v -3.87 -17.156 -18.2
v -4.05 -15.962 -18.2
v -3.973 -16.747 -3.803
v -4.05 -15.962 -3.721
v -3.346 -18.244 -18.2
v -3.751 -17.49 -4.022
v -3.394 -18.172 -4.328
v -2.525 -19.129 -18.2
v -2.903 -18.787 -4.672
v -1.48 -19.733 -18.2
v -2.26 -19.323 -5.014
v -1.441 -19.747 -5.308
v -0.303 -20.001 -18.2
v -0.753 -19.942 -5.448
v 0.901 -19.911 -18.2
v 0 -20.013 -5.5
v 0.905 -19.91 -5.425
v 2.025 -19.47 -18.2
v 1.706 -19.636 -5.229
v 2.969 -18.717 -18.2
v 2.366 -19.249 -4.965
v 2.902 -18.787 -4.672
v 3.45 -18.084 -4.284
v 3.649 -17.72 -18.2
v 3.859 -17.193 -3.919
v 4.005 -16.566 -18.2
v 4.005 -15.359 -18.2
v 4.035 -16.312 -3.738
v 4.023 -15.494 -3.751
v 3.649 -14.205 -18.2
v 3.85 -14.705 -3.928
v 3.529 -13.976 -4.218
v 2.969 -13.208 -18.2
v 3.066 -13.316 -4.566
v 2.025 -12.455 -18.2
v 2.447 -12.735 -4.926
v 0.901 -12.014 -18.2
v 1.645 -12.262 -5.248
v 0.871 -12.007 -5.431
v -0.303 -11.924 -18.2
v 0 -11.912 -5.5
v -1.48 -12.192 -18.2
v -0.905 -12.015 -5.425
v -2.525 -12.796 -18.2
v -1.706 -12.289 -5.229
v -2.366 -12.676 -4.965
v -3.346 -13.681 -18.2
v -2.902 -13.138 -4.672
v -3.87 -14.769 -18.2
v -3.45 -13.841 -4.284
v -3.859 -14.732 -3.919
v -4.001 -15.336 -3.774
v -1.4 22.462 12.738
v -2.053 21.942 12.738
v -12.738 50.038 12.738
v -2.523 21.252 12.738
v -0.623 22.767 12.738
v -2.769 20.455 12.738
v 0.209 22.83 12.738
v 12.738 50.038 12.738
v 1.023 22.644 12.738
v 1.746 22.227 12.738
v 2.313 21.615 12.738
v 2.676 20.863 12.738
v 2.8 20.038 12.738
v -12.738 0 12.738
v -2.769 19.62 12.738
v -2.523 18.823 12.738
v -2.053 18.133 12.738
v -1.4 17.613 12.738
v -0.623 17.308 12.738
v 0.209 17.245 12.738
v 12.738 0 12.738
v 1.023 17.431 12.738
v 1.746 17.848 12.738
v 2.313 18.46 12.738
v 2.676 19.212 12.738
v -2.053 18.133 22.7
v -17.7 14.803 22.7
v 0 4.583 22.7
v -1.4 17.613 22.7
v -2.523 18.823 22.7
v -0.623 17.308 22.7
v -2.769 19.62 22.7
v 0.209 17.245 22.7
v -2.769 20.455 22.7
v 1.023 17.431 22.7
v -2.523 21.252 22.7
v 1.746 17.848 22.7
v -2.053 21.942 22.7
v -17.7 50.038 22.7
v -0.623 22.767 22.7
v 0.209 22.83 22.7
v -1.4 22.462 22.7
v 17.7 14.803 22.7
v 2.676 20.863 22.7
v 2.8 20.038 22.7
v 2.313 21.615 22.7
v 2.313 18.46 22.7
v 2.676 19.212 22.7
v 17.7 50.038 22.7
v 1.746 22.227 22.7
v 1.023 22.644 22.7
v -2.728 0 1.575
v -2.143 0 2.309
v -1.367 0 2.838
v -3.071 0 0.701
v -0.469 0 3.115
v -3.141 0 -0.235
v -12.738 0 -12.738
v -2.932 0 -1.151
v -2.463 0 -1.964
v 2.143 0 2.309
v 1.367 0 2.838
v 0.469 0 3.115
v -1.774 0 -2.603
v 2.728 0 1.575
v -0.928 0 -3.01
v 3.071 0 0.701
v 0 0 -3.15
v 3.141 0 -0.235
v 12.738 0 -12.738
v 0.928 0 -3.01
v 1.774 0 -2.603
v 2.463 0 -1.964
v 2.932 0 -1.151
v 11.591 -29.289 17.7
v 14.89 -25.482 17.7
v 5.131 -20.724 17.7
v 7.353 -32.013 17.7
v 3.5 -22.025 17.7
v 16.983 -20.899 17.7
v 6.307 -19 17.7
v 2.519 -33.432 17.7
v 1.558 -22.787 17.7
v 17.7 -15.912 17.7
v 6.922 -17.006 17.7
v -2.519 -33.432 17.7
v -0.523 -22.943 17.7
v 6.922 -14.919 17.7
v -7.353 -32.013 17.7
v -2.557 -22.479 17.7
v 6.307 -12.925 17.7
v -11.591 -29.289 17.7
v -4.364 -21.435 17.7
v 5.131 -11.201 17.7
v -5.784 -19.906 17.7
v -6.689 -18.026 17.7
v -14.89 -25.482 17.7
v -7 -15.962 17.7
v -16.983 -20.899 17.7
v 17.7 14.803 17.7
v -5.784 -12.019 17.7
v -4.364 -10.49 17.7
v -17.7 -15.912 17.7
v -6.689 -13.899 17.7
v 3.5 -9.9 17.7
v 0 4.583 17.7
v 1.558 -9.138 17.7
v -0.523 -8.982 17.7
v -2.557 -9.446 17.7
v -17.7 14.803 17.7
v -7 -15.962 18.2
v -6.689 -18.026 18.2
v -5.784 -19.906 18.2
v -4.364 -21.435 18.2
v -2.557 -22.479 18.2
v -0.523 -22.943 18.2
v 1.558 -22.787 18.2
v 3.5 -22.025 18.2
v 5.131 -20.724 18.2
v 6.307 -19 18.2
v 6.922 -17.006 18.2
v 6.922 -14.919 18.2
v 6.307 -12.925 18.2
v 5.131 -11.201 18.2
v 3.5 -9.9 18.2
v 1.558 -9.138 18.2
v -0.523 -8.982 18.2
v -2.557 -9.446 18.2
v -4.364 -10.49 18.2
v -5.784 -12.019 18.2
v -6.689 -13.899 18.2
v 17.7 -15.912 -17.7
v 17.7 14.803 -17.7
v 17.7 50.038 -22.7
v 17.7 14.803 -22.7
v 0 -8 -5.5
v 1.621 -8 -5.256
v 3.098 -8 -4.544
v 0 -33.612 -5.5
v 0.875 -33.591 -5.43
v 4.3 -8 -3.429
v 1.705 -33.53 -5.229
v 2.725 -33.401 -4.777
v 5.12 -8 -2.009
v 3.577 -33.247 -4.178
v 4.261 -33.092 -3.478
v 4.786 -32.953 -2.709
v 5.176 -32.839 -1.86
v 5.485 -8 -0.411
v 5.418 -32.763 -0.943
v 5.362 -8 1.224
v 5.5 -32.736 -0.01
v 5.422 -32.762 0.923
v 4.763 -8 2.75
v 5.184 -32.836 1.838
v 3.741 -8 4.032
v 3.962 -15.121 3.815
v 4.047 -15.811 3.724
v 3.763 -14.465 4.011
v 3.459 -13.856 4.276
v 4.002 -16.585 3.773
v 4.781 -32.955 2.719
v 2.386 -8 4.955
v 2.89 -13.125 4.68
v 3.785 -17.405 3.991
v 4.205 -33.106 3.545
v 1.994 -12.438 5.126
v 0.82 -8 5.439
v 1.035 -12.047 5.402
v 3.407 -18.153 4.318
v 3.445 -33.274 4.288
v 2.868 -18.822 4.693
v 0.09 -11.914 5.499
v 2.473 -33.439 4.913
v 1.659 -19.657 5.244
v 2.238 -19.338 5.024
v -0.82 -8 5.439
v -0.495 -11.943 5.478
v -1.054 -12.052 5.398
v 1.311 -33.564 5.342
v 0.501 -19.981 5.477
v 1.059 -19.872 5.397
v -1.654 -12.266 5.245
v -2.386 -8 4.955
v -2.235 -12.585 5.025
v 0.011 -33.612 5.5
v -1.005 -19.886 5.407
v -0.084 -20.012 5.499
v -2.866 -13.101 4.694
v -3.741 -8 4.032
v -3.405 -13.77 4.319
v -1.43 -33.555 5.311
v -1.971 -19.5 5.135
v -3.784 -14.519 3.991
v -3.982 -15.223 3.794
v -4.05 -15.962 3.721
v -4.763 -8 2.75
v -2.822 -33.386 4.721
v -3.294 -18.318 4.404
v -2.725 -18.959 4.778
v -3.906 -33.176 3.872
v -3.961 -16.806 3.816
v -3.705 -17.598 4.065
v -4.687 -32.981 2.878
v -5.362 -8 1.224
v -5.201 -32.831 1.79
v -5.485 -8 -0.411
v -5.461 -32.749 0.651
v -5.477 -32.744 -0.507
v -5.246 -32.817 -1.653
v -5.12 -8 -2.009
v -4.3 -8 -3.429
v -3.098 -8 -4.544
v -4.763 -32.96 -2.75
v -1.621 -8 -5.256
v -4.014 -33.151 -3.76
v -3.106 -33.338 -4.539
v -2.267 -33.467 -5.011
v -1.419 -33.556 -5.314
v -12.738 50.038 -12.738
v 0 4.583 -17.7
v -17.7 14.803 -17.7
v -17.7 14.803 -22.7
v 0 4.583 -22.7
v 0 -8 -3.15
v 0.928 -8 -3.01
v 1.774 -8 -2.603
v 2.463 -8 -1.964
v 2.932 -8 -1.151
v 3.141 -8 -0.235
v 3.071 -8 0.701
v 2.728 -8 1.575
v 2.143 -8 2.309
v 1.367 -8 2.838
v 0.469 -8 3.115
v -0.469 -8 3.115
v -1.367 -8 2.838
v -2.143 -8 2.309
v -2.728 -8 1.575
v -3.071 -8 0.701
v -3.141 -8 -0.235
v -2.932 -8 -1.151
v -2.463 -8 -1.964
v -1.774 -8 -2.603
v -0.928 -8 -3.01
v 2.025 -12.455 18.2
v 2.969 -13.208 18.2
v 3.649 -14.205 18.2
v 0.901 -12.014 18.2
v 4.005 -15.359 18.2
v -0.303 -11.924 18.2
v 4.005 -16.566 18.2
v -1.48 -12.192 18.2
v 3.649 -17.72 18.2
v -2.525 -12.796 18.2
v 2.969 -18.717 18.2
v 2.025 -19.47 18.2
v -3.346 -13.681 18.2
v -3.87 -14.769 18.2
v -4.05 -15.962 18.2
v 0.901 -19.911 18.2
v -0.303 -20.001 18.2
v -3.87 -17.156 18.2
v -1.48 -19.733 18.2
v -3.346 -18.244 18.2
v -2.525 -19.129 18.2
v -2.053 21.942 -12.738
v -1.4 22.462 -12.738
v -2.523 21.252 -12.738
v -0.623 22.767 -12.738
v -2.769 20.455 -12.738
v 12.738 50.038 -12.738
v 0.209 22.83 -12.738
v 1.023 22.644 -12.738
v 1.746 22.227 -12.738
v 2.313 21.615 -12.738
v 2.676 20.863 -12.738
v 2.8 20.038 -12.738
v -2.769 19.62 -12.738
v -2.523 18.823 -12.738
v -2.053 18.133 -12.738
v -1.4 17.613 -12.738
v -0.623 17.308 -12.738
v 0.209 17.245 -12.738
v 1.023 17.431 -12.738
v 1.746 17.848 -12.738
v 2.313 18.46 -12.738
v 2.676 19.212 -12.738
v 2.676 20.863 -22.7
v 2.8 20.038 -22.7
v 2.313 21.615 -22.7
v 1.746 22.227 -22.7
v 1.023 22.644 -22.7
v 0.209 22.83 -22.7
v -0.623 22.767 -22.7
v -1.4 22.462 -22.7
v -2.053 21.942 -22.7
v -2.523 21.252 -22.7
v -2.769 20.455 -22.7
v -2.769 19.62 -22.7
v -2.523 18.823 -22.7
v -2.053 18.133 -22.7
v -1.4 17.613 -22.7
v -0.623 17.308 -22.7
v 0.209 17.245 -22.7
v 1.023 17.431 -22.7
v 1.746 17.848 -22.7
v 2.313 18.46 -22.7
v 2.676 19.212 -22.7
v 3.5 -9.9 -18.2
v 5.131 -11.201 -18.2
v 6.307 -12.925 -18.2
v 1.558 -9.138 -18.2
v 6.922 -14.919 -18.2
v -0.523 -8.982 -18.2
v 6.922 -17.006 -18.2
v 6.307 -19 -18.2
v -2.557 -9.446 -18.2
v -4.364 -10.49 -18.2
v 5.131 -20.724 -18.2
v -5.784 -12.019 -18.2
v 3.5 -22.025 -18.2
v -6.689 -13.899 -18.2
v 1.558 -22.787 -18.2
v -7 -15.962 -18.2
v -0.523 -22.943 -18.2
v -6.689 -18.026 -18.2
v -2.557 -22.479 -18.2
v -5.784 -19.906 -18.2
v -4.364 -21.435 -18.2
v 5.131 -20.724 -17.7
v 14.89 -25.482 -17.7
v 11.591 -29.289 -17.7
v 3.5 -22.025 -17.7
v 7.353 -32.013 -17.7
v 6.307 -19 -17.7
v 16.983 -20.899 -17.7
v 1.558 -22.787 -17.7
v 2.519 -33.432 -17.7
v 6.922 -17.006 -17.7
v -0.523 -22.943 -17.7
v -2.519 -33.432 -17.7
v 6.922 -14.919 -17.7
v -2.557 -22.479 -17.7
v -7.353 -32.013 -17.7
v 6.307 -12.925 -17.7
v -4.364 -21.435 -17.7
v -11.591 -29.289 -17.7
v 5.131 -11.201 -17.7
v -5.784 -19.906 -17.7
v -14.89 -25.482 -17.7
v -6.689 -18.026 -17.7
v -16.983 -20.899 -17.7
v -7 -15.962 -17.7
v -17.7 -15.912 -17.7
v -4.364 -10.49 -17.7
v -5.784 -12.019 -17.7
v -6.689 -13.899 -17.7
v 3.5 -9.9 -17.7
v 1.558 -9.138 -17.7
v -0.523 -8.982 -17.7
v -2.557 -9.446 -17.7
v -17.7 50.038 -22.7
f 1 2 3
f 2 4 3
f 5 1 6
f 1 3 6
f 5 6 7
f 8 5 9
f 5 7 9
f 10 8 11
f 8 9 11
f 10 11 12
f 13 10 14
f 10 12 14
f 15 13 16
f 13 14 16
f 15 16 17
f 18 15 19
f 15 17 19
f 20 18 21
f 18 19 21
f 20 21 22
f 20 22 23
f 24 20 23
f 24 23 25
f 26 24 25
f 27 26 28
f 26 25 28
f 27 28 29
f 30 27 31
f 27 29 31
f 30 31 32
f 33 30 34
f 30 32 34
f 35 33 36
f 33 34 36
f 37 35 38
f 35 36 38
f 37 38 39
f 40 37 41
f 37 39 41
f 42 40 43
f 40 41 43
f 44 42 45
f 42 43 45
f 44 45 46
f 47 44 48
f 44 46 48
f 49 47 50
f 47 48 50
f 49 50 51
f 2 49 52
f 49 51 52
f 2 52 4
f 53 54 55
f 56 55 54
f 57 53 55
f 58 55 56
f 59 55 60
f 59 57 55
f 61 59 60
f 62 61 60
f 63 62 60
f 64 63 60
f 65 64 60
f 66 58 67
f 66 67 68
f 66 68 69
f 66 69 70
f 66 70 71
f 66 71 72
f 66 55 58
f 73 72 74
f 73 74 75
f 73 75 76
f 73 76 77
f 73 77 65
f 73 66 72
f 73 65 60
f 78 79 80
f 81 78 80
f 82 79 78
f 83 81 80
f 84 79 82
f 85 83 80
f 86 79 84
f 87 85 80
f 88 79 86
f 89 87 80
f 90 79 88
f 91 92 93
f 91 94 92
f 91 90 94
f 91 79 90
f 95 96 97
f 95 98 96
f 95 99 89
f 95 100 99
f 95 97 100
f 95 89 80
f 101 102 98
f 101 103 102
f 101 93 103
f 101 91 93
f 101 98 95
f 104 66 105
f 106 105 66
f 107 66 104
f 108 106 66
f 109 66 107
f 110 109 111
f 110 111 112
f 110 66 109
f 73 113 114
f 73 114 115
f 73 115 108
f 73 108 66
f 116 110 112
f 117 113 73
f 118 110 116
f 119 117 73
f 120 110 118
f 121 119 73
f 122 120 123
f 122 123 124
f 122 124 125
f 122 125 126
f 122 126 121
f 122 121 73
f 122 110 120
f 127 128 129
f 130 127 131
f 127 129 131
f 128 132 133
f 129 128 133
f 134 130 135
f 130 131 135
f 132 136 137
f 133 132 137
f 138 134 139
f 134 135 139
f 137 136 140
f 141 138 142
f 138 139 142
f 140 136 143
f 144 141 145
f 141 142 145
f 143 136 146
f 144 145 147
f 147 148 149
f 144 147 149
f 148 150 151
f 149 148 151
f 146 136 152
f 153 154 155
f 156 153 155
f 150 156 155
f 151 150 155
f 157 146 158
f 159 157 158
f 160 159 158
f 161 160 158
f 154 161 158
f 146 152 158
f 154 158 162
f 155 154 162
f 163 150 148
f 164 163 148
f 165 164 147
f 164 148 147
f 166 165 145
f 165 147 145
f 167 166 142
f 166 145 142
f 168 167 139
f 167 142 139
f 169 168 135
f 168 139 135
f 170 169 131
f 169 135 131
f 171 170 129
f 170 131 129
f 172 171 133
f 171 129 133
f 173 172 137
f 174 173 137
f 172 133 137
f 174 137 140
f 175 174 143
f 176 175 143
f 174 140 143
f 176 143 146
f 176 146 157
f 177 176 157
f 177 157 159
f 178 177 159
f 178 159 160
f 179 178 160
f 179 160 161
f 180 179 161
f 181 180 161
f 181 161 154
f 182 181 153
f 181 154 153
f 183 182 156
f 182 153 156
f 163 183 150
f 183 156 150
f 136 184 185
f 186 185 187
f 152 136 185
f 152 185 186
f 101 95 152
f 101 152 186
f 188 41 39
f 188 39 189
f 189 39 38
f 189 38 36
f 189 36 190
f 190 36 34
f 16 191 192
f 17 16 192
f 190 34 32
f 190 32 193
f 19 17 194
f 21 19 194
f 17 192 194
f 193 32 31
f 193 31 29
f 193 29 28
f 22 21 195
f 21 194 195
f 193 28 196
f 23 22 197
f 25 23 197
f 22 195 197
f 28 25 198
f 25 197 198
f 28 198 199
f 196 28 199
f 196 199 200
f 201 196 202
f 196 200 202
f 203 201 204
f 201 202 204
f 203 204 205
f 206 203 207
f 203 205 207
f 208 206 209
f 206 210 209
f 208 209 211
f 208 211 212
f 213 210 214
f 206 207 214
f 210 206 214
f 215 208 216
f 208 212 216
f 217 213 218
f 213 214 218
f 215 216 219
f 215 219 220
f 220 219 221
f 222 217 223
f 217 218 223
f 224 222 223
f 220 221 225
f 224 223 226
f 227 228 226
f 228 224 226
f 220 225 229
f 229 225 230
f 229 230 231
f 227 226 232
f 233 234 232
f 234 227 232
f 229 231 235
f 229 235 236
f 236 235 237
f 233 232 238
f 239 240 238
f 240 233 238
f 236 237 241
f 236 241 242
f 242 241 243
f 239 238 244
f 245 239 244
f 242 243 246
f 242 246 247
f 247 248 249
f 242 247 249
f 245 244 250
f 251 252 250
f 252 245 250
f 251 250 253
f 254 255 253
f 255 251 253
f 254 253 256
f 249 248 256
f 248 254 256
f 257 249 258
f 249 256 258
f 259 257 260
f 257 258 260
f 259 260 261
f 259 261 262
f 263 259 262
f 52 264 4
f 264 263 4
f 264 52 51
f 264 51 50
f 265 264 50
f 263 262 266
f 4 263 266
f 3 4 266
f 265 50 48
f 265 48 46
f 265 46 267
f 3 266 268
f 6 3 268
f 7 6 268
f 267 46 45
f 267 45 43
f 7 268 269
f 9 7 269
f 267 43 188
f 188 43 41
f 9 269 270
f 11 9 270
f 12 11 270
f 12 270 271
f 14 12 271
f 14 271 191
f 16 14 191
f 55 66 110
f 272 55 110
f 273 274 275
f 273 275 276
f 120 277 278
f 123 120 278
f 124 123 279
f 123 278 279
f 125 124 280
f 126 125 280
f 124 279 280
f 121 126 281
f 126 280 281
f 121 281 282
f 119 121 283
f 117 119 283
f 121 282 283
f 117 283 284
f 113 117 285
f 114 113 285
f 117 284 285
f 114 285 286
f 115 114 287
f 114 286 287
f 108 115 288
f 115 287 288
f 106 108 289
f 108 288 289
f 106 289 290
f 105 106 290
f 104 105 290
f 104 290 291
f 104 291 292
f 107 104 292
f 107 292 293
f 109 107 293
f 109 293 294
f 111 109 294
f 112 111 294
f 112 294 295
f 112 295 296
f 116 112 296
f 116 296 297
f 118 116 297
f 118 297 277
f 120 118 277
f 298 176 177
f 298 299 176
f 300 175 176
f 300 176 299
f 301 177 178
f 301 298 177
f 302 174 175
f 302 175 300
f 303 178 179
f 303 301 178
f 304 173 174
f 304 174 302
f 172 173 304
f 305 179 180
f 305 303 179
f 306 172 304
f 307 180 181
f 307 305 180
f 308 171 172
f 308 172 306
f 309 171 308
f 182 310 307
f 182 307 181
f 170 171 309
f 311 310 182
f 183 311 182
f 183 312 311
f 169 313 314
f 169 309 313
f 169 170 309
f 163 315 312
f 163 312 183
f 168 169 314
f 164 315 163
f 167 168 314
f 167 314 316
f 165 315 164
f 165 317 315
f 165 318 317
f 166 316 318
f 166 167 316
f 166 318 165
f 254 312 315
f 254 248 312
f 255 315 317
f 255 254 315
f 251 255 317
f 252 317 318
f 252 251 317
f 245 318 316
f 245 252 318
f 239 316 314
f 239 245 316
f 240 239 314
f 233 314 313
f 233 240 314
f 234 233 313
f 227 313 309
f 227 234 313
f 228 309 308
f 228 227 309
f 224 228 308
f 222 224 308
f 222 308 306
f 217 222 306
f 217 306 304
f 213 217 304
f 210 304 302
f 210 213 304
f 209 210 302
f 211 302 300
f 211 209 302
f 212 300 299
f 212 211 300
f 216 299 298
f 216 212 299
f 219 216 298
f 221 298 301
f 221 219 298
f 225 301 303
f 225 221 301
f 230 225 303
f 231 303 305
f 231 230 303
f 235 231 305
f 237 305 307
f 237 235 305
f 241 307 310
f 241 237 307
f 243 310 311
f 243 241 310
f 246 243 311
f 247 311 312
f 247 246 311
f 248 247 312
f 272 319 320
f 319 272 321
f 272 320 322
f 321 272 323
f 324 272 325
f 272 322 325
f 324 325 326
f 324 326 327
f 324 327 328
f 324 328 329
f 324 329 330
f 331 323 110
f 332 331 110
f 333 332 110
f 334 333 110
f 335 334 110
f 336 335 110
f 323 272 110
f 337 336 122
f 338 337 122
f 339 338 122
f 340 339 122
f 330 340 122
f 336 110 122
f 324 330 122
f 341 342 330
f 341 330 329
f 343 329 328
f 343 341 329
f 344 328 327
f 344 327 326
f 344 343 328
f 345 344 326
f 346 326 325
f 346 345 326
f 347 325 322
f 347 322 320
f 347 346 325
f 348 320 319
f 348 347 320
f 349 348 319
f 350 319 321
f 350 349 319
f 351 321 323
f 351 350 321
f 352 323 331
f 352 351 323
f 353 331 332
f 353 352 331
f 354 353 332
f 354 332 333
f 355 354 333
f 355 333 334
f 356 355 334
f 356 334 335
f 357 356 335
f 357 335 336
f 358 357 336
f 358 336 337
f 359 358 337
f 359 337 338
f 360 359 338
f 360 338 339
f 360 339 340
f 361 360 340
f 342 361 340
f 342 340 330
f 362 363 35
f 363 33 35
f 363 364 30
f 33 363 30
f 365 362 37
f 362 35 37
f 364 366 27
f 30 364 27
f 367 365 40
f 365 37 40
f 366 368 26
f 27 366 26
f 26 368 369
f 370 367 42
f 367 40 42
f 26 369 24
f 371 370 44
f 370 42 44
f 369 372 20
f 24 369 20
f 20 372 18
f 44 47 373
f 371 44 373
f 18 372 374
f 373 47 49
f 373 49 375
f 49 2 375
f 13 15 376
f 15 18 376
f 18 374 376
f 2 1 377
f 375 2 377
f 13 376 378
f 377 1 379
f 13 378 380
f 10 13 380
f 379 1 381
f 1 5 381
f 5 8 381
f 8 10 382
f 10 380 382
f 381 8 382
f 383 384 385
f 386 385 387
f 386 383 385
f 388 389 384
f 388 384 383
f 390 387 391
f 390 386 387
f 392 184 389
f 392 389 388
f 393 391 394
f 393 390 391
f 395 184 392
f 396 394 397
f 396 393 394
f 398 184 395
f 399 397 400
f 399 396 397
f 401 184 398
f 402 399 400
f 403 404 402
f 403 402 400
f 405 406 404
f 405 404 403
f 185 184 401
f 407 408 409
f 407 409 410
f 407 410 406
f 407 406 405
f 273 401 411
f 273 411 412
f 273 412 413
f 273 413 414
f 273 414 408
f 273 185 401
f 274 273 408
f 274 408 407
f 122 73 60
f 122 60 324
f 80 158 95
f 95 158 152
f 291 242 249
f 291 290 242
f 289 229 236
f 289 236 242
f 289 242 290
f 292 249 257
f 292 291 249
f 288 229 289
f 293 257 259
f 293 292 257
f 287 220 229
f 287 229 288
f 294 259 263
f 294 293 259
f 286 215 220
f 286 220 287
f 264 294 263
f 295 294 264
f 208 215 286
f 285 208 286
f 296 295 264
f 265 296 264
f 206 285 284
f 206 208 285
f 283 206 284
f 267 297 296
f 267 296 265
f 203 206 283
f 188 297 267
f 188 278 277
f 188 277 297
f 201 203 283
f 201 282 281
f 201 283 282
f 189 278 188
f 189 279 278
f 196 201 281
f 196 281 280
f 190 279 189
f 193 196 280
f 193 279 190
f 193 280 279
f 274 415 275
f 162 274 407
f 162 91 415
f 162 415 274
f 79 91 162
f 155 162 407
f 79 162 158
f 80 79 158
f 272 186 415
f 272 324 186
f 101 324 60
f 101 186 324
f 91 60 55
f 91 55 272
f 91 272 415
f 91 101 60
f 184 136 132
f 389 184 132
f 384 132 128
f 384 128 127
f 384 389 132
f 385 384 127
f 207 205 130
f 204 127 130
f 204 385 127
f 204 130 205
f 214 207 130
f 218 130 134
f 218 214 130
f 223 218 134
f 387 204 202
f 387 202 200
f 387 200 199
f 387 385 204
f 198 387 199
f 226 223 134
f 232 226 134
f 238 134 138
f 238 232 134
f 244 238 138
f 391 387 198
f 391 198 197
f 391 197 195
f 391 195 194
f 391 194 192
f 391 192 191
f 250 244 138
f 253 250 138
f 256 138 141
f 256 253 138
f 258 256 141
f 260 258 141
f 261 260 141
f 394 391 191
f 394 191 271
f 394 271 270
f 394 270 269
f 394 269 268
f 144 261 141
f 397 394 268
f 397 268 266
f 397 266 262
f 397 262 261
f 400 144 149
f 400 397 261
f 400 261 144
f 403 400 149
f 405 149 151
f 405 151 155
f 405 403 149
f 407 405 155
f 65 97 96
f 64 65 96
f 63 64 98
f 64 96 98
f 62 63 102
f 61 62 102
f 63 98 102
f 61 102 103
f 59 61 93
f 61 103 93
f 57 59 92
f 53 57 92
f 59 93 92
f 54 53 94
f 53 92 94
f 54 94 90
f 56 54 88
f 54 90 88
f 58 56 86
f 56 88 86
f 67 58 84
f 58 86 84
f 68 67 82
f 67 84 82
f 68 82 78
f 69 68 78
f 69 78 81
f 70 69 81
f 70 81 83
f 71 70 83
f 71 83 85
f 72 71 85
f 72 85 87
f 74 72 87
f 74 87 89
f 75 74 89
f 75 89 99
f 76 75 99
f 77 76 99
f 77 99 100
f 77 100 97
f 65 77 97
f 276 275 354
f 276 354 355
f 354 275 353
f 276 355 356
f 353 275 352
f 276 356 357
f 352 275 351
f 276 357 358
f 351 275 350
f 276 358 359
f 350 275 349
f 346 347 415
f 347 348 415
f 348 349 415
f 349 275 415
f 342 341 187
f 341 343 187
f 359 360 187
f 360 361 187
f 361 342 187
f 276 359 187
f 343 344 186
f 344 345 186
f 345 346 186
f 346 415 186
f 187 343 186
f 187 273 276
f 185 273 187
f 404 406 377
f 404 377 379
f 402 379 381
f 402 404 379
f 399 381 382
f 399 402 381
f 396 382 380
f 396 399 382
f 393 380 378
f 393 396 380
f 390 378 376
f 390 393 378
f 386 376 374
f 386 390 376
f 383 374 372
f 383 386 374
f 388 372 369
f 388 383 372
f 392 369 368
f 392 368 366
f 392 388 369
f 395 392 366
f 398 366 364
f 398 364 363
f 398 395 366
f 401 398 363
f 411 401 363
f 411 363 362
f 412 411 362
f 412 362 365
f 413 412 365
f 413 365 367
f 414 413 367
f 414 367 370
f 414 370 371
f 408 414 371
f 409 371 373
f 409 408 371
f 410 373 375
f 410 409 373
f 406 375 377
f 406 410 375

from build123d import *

# Parameters (mm, degrees)
SKETCH1_W           = 35.4
SKETCH1_H           = 35.4
SKETCH1_W_2         = 25.475
SKETCH1_H_2         = 25.475
BOSS_EXTRUDE1_DEPTH = 50.0375
SKETCH1_3_W         = 35.4
SKETCH1_3_H         = 35.4
SKETCH1_3_W_2       = 25.475
SKETCH1_3_H_2       = 25.475
BOSS_EXTRUDE2_DEPTH = 9.9625
SKETCH2_R           = 4.05
BOSS_EXTRUDE5_DEPTH = 35.4
SKETCH3_R           = 3.15
CUT_EXTRUDE1_DEPTH  = 88.31496149
SKETCH4_R           = 5.5
CUT_EXTRUDE2_DEPTH  = 25.6125
SKETCH5_R           = 7
SKETCH5_R_2         = 4.05
BOSS_EXTRUDE6_DEPTH = 0.5
BOSS_EXTRUDE7_DEPTH = 5
CUT_EXTRUDE3_REACH  = 69.006
SKETCH7_R           = 2.8


with BuildPart() as part:
    # Sketch1 → Boss-Extrude1 (new body)
    with BuildSketch(Plane(origin=(0, 0, 0), x_dir=(1, 0, 0), z_dir=(0, 1, 0))):
        Rectangle(SKETCH1_W, SKETCH1_H)
        Rectangle(SKETCH1_W_2, SKETCH1_H_2, mode=Mode.SUBTRACT)
    extrude(amount=BOSS_EXTRUDE1_DEPTH)

    # Sketch1<3> → Boss-Extrude2 (add)
    # profile 1 of 2: a face of its own
    with BuildSketch(Plane(origin=(0, 0, 0), x_dir=(1, 0, 0), z_dir=(0, 1, 0))):
        Rectangle(SKETCH1_3_W, SKETCH1_3_H)
        Rectangle(SKETCH1_3_W_2, SKETCH1_3_H_2, mode=Mode.SUBTRACT)
    # profile 2 of 2: a face of its own
    with BuildSketch(Plane(origin=(0, 0, 0), x_dir=(1, 0, 0), z_dir=(0, 1, 0))):
        Rectangle(SKETCH1_3_W_2, SKETCH1_3_H_2)
    extrude(amount=-BOSS_EXTRUDE2_DEPTH)

    # Sketch2 → Boss-Extrude5 (add)
    with BuildSketch(Plane.XY.offset(-17.7)):
        with BuildLine():
            Line((-17.7, -15.9125), (-17.7, -9.9625))
            Line((-17.7, -9.9625), (17.7, -9.9625))
            Line((17.7, -9.9625), (17.7, -15.9125))
            ThreePointArc((17.7, -15.9125), (0, -33.6125), (-17.7, -15.9125))
        make_face()
        with Locations(Location((0, -15.9625, 0), (0, 0, 180))):
            Circle(SKETCH2_R, mode=Mode.SUBTRACT)
    extrude(amount=BOSS_EXTRUDE5_DEPTH)

    # Sketch3 → Cut-Extrude1 (cut, through all)
    with BuildSketch(Plane(origin=(0, -33.6125, 0), x_dir=(-1, 0, 0), z_dir=(0, -1, 0))):
        with Locations(Location((0, 0, 0), (0, 0, 90))):
            Circle(SKETCH3_R)
    extrude(amount=-CUT_EXTRUDE1_DEPTH, mode=Mode.SUBTRACT)

    # Sketch4 → Cut-Extrude2 (cut)
    with BuildSketch(Plane(origin=(0, -33.6125, 0), x_dir=(-1, 0, 0), z_dir=(0, -1, 0))):
        with Locations(Location((0, 0, 0), (0, 0, 90))):
            Circle(SKETCH4_R)
    extrude(amount=-CUT_EXTRUDE2_DEPTH, mode=Mode.SUBTRACT)

    # Sketch5 → Boss-Extrude6 (add)
    with BuildSketch(Plane.XY.offset(17.7)):
        with Locations(Location((0, -15.9625, 0), (0, 0, 180))):
            Circle(SKETCH5_R)
        with Locations(Location((0, -15.9625, 0), (0, 0, 180))):
            Circle(SKETCH5_R_2, mode=Mode.SUBTRACT)
    boss_extrude6 = extrude(amount=BOSS_EXTRUDE6_DEPTH)

    # Mirror1: Boss-Extrude6 across plane
    add(boss_extrude6.mirror(Plane.XY))

    # Sketch6 → Boss-Extrude7 (add)
    with BuildSketch(Plane.XY.offset(17.7)):
        Polygon((0, 4.583434556), (17.7, 14.802534321), (17.7, 50.0375), (-17.7, 50.0375), (-17.7, 14.802534321), align=None)
    boss_extrude7 = extrude(amount=BOSS_EXTRUDE7_DEPTH)

    # Sketch7 → Cut-Extrude3 (cut, up to next)
    with BuildSketch(Plane.XY.offset(22.7), mode=Mode.PRIVATE) as cut_extrude3_sk1:
        with Locations((0, 20.0375)):
            Circle(SKETCH7_R)
    cut_extrude3_tool1 = extrude(cut_extrude3_sk1.sketch, amount=-CUT_EXTRUDE3_REACH, mode=Mode.PRIVATE) & part.part
    cut_extrude3 = cut_extrude3_tool1.solids().sort_by_distance((0, 20.0375, 22.7))[0]
    add(cut_extrude3, mode=Mode.SUBTRACT)

    # Mirror2: Boss-Extrude7, Cut-Extrude3 across plane
    add(boss_extrude7.mirror(Plane.XY))
    add(cut_extrude3.mirror(Plane.XY), mode=Mode.SUBTRACT)


solid = part.part
